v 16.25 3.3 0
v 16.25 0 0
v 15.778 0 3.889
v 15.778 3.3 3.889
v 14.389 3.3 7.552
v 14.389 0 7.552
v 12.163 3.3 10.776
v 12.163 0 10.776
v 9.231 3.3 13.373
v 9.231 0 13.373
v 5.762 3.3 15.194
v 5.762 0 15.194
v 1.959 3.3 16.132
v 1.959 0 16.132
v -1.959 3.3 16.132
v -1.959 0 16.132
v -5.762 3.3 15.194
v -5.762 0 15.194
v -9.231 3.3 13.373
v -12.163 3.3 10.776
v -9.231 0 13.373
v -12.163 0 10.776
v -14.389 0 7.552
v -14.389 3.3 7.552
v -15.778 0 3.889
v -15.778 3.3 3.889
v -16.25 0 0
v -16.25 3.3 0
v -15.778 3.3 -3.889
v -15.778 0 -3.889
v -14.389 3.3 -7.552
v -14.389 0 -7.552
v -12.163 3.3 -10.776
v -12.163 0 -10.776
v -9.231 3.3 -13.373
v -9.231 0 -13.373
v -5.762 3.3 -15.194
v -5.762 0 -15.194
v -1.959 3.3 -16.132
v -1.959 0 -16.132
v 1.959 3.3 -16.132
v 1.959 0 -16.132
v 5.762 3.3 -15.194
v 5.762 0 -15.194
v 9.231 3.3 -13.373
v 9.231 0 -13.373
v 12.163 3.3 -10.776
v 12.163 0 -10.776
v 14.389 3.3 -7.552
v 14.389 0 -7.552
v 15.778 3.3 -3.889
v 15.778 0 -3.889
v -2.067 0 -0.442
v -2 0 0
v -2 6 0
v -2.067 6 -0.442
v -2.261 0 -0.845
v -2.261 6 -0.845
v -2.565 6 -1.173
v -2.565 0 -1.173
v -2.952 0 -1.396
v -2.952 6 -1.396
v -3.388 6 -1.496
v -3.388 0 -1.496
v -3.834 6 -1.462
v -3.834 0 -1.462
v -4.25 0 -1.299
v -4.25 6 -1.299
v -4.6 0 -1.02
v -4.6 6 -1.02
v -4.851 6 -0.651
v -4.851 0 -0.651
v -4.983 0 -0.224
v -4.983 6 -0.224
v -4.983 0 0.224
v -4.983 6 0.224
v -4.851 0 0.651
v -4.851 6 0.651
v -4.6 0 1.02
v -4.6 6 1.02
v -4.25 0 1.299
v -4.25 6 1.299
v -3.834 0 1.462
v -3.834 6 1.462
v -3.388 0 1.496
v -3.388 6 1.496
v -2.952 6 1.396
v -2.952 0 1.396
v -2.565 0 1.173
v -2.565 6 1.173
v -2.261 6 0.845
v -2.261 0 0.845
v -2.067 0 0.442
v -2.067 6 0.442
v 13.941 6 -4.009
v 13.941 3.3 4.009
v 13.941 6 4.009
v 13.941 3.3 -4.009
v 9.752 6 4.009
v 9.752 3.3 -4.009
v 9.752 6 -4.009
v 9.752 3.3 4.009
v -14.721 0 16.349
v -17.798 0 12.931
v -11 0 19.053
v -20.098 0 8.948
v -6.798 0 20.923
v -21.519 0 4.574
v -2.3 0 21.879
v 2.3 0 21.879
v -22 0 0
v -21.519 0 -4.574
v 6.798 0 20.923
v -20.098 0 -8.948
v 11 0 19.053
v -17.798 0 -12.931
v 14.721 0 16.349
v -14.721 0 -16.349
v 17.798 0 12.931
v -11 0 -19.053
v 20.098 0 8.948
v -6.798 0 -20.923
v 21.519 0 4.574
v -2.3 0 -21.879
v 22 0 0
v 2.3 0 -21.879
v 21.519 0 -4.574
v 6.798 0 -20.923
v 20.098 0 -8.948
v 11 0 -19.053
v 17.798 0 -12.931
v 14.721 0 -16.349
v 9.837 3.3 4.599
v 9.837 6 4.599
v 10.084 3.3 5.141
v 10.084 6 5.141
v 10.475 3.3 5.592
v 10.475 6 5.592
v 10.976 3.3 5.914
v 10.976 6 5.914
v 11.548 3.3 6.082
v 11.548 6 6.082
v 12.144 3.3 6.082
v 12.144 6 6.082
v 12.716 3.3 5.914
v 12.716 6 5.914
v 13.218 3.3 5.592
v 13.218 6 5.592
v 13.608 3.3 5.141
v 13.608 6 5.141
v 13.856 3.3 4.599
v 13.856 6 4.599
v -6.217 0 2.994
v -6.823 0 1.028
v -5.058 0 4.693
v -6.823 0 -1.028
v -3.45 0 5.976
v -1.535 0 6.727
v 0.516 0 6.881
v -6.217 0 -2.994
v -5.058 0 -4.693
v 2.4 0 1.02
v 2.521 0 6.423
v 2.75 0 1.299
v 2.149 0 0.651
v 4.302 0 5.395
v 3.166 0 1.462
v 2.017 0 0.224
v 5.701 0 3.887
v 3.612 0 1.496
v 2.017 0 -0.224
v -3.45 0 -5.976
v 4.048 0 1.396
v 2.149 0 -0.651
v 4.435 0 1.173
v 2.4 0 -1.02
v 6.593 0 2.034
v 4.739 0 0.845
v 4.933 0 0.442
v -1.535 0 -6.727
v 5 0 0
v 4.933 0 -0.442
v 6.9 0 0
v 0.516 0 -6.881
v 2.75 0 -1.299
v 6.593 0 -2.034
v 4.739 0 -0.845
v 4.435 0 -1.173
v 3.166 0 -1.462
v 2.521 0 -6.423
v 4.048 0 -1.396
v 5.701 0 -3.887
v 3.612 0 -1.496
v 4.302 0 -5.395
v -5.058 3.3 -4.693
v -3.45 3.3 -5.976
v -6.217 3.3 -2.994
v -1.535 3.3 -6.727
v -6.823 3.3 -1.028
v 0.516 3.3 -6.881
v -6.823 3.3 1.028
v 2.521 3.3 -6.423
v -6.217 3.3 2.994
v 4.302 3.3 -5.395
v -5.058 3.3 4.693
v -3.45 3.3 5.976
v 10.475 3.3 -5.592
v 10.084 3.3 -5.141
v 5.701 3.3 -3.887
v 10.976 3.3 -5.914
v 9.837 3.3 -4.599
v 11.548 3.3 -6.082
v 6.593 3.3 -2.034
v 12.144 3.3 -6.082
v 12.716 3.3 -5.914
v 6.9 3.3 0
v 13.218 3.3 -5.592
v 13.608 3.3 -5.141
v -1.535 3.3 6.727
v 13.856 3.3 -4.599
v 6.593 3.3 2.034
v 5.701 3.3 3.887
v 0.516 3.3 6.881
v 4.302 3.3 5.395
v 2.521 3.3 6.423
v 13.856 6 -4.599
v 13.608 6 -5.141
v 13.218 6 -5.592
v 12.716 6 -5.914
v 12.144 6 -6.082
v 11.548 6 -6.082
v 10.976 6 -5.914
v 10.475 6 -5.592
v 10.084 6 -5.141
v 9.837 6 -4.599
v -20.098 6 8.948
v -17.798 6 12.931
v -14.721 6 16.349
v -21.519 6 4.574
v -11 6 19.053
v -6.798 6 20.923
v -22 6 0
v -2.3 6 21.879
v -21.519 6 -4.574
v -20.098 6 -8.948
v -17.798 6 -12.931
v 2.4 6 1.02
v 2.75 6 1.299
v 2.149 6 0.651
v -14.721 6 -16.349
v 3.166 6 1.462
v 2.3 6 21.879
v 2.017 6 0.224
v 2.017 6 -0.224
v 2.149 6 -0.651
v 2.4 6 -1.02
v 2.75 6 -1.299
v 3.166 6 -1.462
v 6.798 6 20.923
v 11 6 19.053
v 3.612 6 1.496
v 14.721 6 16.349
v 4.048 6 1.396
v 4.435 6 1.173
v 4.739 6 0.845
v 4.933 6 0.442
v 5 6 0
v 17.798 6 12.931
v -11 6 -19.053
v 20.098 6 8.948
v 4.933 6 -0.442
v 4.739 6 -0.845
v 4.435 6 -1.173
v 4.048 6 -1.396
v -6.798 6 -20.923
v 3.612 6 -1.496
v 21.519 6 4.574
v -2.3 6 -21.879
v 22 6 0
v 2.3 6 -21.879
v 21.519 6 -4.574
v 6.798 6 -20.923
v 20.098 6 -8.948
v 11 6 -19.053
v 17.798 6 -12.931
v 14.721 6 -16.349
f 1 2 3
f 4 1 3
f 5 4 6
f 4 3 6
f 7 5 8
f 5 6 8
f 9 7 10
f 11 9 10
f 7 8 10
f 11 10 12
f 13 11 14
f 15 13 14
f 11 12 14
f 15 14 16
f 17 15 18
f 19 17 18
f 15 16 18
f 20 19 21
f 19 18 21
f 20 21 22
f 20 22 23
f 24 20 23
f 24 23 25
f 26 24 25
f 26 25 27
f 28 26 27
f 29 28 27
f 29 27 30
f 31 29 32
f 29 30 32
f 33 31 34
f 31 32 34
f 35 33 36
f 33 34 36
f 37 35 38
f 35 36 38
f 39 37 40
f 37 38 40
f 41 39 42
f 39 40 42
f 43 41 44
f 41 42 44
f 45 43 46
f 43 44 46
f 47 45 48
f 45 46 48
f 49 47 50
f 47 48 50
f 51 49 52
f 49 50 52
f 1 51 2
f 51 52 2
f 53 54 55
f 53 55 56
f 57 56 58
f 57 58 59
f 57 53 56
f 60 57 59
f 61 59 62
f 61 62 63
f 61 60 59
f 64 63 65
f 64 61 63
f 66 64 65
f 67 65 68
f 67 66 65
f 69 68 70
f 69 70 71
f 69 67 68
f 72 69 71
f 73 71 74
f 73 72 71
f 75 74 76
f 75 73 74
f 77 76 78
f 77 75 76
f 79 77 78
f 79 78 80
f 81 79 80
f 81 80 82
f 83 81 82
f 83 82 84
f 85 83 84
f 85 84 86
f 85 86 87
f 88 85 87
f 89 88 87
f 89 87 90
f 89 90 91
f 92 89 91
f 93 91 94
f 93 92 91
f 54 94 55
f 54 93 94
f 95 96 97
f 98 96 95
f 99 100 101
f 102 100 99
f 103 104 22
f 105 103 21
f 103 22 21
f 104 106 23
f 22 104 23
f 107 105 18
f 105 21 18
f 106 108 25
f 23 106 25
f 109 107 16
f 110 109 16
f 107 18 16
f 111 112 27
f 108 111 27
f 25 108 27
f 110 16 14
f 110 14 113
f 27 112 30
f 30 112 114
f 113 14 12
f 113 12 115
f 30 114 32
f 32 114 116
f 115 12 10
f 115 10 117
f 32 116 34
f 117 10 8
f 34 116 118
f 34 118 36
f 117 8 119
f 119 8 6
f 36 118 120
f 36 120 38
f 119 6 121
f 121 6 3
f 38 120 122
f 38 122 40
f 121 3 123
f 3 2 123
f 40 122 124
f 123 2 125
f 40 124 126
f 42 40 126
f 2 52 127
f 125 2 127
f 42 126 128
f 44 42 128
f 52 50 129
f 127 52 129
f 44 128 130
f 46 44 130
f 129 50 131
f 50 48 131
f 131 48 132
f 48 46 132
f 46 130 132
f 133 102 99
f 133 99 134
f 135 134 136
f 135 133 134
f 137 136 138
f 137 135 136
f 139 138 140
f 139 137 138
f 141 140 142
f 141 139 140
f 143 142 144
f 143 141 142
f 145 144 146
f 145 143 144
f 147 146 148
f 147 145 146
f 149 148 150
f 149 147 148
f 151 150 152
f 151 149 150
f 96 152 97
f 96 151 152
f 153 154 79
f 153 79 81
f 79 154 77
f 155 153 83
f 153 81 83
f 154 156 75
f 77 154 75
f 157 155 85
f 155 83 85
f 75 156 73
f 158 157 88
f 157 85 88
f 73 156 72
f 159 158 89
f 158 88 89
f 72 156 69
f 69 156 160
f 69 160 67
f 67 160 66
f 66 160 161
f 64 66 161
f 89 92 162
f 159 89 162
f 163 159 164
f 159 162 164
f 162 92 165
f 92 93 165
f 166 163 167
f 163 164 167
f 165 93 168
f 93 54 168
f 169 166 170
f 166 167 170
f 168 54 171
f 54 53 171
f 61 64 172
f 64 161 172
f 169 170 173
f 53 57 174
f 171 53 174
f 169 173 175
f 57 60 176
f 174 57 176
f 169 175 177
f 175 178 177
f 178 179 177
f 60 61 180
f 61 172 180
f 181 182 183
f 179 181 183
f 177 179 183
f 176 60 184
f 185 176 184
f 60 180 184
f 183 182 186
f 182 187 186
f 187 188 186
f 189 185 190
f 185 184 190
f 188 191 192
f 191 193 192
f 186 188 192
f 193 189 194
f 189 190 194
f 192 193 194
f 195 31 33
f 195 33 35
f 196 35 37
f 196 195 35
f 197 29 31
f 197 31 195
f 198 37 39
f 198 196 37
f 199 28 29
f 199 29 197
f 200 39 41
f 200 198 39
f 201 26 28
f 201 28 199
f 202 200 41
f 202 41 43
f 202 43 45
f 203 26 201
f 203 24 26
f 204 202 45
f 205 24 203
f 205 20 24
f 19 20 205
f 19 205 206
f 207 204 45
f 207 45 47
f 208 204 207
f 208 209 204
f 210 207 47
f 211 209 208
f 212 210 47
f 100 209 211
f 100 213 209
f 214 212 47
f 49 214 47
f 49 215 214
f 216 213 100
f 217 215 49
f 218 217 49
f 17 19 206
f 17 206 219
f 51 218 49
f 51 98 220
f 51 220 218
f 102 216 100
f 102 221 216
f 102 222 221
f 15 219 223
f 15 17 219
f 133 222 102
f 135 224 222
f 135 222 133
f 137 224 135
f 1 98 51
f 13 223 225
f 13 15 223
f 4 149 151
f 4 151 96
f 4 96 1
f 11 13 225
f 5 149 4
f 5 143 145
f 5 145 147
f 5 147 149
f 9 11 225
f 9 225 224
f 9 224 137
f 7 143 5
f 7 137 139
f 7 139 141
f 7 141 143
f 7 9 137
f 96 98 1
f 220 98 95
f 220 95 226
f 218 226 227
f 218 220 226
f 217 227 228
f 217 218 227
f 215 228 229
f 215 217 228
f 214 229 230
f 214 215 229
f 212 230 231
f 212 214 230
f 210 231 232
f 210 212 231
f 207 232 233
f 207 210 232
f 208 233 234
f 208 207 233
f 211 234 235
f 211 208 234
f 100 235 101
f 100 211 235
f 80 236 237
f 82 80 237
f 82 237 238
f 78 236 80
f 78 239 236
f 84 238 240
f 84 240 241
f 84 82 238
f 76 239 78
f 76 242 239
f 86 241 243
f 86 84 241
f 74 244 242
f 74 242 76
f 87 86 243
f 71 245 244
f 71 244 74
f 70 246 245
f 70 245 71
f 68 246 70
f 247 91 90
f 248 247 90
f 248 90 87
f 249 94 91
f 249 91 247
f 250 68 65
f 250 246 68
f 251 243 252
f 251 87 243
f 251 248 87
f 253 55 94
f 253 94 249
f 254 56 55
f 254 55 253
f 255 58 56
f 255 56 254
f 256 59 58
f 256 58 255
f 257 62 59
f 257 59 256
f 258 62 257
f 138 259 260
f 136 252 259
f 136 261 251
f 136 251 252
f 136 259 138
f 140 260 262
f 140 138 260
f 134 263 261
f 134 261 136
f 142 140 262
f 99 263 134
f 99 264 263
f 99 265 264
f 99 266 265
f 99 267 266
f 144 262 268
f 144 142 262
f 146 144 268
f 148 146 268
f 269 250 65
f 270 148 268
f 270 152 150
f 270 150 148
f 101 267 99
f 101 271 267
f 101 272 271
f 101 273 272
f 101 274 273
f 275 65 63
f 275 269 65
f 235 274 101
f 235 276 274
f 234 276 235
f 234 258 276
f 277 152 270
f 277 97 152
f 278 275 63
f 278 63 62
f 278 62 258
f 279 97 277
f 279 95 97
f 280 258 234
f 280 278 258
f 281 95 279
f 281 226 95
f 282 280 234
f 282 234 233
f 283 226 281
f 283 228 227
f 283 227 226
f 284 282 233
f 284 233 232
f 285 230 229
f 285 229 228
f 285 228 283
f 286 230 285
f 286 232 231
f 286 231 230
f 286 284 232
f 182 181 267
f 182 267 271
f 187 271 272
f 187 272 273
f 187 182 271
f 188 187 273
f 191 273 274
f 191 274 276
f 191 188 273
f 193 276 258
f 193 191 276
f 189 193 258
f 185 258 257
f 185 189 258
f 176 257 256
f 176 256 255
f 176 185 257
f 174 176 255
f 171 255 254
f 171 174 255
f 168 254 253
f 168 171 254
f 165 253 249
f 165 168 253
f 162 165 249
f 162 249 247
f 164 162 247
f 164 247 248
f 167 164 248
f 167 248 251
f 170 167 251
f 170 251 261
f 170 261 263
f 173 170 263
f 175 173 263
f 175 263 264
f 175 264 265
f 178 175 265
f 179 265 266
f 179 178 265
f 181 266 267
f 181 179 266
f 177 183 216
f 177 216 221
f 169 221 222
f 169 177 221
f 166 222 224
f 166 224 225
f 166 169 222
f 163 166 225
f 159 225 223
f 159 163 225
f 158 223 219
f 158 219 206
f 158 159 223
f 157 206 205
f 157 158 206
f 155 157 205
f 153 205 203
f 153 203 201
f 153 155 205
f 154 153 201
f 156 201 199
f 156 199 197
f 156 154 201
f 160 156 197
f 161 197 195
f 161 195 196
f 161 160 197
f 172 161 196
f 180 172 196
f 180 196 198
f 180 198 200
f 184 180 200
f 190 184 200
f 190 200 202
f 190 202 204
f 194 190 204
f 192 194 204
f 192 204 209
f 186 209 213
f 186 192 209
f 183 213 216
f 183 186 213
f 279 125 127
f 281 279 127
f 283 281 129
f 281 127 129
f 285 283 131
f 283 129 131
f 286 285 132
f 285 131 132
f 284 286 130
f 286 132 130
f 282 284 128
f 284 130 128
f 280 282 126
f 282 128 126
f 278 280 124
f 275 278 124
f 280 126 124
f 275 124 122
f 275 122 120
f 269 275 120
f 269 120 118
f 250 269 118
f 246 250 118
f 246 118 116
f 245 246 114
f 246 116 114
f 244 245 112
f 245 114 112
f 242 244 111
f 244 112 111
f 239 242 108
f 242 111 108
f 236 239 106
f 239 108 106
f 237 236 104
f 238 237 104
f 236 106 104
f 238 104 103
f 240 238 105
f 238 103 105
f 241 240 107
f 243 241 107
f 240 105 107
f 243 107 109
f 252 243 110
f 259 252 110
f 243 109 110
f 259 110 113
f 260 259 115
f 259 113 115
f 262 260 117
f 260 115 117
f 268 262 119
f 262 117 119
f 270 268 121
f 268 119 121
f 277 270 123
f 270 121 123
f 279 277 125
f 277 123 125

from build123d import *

# Parameters (mm, degrees)
ESQUISSE1_R             = 22
ESQUISSE1_R_2           = 1.5
BOSS_EXTRU_1_DEPTH      = 6
ESQUISSE2_R             = 16.25
ESQUISSE2_R_2           = 6.9
ENL_V_MAT_EXTRU_1_DEPTH = 3.3
ENL_V_MAT_EXTRU_2_DEPTH = 3


with BuildPart() as part:
    # Esquisse1 → Boss.-Extru.1 (new body)
    with BuildSketch(Plane(origin=(0, 0, 0), x_dir=(1, 0, 0), z_dir=(0, 1, 0))):
        Circle(ESQUISSE1_R)
        with Locations((-3.5, 0)):
            Circle(ESQUISSE1_R_2, mode=Mode.SUBTRACT)
        with Locations((3.5, 0)):
            Circle(ESQUISSE1_R_2, mode=Mode.SUBTRACT)
    extrude(amount=BOSS_EXTRU_1_DEPTH)

    # Esquisse2 → Enlèv. mat.-Extru.1 (cut)
    with BuildSketch(Plane.XZ):
        Circle(ESQUISSE2_R)
        Circle(ESQUISSE2_R_2, mode=Mode.SUBTRACT)
    extrude(amount=-ENL_V_MAT_EXTRU_1_DEPTH, mode=Mode.SUBTRACT)

    # Esquisse3 → Enlèv. mat.-Extru.2 (cut)
    with BuildSketch(Plane(origin=(0, 3.3, 0), x_dir=(-1, 0, 0), z_dir=(0, -1, 0))):
        with BuildLine():
            Line((-13.940625792, -4.008679646), (-13.940625792, 4.008679646))
            ThreePointArc((-13.940625792, 4.008679646), (-11.846146155, 6.103159283), (-9.751666518, 4.008679646))
            Line((-9.751666518, 4.008679646), (-9.751666518, -4.008679646))
            ThreePointArc((-9.751666518, -4.008679646), (-11.846146155, -6.103159283), (-13.940625792, -4.008679646))
        make_face()
    extrude(amount=-ENL_V_MAT_EXTRU_2_DEPTH, mode=Mode.SUBTRACT)


solid = part.part
